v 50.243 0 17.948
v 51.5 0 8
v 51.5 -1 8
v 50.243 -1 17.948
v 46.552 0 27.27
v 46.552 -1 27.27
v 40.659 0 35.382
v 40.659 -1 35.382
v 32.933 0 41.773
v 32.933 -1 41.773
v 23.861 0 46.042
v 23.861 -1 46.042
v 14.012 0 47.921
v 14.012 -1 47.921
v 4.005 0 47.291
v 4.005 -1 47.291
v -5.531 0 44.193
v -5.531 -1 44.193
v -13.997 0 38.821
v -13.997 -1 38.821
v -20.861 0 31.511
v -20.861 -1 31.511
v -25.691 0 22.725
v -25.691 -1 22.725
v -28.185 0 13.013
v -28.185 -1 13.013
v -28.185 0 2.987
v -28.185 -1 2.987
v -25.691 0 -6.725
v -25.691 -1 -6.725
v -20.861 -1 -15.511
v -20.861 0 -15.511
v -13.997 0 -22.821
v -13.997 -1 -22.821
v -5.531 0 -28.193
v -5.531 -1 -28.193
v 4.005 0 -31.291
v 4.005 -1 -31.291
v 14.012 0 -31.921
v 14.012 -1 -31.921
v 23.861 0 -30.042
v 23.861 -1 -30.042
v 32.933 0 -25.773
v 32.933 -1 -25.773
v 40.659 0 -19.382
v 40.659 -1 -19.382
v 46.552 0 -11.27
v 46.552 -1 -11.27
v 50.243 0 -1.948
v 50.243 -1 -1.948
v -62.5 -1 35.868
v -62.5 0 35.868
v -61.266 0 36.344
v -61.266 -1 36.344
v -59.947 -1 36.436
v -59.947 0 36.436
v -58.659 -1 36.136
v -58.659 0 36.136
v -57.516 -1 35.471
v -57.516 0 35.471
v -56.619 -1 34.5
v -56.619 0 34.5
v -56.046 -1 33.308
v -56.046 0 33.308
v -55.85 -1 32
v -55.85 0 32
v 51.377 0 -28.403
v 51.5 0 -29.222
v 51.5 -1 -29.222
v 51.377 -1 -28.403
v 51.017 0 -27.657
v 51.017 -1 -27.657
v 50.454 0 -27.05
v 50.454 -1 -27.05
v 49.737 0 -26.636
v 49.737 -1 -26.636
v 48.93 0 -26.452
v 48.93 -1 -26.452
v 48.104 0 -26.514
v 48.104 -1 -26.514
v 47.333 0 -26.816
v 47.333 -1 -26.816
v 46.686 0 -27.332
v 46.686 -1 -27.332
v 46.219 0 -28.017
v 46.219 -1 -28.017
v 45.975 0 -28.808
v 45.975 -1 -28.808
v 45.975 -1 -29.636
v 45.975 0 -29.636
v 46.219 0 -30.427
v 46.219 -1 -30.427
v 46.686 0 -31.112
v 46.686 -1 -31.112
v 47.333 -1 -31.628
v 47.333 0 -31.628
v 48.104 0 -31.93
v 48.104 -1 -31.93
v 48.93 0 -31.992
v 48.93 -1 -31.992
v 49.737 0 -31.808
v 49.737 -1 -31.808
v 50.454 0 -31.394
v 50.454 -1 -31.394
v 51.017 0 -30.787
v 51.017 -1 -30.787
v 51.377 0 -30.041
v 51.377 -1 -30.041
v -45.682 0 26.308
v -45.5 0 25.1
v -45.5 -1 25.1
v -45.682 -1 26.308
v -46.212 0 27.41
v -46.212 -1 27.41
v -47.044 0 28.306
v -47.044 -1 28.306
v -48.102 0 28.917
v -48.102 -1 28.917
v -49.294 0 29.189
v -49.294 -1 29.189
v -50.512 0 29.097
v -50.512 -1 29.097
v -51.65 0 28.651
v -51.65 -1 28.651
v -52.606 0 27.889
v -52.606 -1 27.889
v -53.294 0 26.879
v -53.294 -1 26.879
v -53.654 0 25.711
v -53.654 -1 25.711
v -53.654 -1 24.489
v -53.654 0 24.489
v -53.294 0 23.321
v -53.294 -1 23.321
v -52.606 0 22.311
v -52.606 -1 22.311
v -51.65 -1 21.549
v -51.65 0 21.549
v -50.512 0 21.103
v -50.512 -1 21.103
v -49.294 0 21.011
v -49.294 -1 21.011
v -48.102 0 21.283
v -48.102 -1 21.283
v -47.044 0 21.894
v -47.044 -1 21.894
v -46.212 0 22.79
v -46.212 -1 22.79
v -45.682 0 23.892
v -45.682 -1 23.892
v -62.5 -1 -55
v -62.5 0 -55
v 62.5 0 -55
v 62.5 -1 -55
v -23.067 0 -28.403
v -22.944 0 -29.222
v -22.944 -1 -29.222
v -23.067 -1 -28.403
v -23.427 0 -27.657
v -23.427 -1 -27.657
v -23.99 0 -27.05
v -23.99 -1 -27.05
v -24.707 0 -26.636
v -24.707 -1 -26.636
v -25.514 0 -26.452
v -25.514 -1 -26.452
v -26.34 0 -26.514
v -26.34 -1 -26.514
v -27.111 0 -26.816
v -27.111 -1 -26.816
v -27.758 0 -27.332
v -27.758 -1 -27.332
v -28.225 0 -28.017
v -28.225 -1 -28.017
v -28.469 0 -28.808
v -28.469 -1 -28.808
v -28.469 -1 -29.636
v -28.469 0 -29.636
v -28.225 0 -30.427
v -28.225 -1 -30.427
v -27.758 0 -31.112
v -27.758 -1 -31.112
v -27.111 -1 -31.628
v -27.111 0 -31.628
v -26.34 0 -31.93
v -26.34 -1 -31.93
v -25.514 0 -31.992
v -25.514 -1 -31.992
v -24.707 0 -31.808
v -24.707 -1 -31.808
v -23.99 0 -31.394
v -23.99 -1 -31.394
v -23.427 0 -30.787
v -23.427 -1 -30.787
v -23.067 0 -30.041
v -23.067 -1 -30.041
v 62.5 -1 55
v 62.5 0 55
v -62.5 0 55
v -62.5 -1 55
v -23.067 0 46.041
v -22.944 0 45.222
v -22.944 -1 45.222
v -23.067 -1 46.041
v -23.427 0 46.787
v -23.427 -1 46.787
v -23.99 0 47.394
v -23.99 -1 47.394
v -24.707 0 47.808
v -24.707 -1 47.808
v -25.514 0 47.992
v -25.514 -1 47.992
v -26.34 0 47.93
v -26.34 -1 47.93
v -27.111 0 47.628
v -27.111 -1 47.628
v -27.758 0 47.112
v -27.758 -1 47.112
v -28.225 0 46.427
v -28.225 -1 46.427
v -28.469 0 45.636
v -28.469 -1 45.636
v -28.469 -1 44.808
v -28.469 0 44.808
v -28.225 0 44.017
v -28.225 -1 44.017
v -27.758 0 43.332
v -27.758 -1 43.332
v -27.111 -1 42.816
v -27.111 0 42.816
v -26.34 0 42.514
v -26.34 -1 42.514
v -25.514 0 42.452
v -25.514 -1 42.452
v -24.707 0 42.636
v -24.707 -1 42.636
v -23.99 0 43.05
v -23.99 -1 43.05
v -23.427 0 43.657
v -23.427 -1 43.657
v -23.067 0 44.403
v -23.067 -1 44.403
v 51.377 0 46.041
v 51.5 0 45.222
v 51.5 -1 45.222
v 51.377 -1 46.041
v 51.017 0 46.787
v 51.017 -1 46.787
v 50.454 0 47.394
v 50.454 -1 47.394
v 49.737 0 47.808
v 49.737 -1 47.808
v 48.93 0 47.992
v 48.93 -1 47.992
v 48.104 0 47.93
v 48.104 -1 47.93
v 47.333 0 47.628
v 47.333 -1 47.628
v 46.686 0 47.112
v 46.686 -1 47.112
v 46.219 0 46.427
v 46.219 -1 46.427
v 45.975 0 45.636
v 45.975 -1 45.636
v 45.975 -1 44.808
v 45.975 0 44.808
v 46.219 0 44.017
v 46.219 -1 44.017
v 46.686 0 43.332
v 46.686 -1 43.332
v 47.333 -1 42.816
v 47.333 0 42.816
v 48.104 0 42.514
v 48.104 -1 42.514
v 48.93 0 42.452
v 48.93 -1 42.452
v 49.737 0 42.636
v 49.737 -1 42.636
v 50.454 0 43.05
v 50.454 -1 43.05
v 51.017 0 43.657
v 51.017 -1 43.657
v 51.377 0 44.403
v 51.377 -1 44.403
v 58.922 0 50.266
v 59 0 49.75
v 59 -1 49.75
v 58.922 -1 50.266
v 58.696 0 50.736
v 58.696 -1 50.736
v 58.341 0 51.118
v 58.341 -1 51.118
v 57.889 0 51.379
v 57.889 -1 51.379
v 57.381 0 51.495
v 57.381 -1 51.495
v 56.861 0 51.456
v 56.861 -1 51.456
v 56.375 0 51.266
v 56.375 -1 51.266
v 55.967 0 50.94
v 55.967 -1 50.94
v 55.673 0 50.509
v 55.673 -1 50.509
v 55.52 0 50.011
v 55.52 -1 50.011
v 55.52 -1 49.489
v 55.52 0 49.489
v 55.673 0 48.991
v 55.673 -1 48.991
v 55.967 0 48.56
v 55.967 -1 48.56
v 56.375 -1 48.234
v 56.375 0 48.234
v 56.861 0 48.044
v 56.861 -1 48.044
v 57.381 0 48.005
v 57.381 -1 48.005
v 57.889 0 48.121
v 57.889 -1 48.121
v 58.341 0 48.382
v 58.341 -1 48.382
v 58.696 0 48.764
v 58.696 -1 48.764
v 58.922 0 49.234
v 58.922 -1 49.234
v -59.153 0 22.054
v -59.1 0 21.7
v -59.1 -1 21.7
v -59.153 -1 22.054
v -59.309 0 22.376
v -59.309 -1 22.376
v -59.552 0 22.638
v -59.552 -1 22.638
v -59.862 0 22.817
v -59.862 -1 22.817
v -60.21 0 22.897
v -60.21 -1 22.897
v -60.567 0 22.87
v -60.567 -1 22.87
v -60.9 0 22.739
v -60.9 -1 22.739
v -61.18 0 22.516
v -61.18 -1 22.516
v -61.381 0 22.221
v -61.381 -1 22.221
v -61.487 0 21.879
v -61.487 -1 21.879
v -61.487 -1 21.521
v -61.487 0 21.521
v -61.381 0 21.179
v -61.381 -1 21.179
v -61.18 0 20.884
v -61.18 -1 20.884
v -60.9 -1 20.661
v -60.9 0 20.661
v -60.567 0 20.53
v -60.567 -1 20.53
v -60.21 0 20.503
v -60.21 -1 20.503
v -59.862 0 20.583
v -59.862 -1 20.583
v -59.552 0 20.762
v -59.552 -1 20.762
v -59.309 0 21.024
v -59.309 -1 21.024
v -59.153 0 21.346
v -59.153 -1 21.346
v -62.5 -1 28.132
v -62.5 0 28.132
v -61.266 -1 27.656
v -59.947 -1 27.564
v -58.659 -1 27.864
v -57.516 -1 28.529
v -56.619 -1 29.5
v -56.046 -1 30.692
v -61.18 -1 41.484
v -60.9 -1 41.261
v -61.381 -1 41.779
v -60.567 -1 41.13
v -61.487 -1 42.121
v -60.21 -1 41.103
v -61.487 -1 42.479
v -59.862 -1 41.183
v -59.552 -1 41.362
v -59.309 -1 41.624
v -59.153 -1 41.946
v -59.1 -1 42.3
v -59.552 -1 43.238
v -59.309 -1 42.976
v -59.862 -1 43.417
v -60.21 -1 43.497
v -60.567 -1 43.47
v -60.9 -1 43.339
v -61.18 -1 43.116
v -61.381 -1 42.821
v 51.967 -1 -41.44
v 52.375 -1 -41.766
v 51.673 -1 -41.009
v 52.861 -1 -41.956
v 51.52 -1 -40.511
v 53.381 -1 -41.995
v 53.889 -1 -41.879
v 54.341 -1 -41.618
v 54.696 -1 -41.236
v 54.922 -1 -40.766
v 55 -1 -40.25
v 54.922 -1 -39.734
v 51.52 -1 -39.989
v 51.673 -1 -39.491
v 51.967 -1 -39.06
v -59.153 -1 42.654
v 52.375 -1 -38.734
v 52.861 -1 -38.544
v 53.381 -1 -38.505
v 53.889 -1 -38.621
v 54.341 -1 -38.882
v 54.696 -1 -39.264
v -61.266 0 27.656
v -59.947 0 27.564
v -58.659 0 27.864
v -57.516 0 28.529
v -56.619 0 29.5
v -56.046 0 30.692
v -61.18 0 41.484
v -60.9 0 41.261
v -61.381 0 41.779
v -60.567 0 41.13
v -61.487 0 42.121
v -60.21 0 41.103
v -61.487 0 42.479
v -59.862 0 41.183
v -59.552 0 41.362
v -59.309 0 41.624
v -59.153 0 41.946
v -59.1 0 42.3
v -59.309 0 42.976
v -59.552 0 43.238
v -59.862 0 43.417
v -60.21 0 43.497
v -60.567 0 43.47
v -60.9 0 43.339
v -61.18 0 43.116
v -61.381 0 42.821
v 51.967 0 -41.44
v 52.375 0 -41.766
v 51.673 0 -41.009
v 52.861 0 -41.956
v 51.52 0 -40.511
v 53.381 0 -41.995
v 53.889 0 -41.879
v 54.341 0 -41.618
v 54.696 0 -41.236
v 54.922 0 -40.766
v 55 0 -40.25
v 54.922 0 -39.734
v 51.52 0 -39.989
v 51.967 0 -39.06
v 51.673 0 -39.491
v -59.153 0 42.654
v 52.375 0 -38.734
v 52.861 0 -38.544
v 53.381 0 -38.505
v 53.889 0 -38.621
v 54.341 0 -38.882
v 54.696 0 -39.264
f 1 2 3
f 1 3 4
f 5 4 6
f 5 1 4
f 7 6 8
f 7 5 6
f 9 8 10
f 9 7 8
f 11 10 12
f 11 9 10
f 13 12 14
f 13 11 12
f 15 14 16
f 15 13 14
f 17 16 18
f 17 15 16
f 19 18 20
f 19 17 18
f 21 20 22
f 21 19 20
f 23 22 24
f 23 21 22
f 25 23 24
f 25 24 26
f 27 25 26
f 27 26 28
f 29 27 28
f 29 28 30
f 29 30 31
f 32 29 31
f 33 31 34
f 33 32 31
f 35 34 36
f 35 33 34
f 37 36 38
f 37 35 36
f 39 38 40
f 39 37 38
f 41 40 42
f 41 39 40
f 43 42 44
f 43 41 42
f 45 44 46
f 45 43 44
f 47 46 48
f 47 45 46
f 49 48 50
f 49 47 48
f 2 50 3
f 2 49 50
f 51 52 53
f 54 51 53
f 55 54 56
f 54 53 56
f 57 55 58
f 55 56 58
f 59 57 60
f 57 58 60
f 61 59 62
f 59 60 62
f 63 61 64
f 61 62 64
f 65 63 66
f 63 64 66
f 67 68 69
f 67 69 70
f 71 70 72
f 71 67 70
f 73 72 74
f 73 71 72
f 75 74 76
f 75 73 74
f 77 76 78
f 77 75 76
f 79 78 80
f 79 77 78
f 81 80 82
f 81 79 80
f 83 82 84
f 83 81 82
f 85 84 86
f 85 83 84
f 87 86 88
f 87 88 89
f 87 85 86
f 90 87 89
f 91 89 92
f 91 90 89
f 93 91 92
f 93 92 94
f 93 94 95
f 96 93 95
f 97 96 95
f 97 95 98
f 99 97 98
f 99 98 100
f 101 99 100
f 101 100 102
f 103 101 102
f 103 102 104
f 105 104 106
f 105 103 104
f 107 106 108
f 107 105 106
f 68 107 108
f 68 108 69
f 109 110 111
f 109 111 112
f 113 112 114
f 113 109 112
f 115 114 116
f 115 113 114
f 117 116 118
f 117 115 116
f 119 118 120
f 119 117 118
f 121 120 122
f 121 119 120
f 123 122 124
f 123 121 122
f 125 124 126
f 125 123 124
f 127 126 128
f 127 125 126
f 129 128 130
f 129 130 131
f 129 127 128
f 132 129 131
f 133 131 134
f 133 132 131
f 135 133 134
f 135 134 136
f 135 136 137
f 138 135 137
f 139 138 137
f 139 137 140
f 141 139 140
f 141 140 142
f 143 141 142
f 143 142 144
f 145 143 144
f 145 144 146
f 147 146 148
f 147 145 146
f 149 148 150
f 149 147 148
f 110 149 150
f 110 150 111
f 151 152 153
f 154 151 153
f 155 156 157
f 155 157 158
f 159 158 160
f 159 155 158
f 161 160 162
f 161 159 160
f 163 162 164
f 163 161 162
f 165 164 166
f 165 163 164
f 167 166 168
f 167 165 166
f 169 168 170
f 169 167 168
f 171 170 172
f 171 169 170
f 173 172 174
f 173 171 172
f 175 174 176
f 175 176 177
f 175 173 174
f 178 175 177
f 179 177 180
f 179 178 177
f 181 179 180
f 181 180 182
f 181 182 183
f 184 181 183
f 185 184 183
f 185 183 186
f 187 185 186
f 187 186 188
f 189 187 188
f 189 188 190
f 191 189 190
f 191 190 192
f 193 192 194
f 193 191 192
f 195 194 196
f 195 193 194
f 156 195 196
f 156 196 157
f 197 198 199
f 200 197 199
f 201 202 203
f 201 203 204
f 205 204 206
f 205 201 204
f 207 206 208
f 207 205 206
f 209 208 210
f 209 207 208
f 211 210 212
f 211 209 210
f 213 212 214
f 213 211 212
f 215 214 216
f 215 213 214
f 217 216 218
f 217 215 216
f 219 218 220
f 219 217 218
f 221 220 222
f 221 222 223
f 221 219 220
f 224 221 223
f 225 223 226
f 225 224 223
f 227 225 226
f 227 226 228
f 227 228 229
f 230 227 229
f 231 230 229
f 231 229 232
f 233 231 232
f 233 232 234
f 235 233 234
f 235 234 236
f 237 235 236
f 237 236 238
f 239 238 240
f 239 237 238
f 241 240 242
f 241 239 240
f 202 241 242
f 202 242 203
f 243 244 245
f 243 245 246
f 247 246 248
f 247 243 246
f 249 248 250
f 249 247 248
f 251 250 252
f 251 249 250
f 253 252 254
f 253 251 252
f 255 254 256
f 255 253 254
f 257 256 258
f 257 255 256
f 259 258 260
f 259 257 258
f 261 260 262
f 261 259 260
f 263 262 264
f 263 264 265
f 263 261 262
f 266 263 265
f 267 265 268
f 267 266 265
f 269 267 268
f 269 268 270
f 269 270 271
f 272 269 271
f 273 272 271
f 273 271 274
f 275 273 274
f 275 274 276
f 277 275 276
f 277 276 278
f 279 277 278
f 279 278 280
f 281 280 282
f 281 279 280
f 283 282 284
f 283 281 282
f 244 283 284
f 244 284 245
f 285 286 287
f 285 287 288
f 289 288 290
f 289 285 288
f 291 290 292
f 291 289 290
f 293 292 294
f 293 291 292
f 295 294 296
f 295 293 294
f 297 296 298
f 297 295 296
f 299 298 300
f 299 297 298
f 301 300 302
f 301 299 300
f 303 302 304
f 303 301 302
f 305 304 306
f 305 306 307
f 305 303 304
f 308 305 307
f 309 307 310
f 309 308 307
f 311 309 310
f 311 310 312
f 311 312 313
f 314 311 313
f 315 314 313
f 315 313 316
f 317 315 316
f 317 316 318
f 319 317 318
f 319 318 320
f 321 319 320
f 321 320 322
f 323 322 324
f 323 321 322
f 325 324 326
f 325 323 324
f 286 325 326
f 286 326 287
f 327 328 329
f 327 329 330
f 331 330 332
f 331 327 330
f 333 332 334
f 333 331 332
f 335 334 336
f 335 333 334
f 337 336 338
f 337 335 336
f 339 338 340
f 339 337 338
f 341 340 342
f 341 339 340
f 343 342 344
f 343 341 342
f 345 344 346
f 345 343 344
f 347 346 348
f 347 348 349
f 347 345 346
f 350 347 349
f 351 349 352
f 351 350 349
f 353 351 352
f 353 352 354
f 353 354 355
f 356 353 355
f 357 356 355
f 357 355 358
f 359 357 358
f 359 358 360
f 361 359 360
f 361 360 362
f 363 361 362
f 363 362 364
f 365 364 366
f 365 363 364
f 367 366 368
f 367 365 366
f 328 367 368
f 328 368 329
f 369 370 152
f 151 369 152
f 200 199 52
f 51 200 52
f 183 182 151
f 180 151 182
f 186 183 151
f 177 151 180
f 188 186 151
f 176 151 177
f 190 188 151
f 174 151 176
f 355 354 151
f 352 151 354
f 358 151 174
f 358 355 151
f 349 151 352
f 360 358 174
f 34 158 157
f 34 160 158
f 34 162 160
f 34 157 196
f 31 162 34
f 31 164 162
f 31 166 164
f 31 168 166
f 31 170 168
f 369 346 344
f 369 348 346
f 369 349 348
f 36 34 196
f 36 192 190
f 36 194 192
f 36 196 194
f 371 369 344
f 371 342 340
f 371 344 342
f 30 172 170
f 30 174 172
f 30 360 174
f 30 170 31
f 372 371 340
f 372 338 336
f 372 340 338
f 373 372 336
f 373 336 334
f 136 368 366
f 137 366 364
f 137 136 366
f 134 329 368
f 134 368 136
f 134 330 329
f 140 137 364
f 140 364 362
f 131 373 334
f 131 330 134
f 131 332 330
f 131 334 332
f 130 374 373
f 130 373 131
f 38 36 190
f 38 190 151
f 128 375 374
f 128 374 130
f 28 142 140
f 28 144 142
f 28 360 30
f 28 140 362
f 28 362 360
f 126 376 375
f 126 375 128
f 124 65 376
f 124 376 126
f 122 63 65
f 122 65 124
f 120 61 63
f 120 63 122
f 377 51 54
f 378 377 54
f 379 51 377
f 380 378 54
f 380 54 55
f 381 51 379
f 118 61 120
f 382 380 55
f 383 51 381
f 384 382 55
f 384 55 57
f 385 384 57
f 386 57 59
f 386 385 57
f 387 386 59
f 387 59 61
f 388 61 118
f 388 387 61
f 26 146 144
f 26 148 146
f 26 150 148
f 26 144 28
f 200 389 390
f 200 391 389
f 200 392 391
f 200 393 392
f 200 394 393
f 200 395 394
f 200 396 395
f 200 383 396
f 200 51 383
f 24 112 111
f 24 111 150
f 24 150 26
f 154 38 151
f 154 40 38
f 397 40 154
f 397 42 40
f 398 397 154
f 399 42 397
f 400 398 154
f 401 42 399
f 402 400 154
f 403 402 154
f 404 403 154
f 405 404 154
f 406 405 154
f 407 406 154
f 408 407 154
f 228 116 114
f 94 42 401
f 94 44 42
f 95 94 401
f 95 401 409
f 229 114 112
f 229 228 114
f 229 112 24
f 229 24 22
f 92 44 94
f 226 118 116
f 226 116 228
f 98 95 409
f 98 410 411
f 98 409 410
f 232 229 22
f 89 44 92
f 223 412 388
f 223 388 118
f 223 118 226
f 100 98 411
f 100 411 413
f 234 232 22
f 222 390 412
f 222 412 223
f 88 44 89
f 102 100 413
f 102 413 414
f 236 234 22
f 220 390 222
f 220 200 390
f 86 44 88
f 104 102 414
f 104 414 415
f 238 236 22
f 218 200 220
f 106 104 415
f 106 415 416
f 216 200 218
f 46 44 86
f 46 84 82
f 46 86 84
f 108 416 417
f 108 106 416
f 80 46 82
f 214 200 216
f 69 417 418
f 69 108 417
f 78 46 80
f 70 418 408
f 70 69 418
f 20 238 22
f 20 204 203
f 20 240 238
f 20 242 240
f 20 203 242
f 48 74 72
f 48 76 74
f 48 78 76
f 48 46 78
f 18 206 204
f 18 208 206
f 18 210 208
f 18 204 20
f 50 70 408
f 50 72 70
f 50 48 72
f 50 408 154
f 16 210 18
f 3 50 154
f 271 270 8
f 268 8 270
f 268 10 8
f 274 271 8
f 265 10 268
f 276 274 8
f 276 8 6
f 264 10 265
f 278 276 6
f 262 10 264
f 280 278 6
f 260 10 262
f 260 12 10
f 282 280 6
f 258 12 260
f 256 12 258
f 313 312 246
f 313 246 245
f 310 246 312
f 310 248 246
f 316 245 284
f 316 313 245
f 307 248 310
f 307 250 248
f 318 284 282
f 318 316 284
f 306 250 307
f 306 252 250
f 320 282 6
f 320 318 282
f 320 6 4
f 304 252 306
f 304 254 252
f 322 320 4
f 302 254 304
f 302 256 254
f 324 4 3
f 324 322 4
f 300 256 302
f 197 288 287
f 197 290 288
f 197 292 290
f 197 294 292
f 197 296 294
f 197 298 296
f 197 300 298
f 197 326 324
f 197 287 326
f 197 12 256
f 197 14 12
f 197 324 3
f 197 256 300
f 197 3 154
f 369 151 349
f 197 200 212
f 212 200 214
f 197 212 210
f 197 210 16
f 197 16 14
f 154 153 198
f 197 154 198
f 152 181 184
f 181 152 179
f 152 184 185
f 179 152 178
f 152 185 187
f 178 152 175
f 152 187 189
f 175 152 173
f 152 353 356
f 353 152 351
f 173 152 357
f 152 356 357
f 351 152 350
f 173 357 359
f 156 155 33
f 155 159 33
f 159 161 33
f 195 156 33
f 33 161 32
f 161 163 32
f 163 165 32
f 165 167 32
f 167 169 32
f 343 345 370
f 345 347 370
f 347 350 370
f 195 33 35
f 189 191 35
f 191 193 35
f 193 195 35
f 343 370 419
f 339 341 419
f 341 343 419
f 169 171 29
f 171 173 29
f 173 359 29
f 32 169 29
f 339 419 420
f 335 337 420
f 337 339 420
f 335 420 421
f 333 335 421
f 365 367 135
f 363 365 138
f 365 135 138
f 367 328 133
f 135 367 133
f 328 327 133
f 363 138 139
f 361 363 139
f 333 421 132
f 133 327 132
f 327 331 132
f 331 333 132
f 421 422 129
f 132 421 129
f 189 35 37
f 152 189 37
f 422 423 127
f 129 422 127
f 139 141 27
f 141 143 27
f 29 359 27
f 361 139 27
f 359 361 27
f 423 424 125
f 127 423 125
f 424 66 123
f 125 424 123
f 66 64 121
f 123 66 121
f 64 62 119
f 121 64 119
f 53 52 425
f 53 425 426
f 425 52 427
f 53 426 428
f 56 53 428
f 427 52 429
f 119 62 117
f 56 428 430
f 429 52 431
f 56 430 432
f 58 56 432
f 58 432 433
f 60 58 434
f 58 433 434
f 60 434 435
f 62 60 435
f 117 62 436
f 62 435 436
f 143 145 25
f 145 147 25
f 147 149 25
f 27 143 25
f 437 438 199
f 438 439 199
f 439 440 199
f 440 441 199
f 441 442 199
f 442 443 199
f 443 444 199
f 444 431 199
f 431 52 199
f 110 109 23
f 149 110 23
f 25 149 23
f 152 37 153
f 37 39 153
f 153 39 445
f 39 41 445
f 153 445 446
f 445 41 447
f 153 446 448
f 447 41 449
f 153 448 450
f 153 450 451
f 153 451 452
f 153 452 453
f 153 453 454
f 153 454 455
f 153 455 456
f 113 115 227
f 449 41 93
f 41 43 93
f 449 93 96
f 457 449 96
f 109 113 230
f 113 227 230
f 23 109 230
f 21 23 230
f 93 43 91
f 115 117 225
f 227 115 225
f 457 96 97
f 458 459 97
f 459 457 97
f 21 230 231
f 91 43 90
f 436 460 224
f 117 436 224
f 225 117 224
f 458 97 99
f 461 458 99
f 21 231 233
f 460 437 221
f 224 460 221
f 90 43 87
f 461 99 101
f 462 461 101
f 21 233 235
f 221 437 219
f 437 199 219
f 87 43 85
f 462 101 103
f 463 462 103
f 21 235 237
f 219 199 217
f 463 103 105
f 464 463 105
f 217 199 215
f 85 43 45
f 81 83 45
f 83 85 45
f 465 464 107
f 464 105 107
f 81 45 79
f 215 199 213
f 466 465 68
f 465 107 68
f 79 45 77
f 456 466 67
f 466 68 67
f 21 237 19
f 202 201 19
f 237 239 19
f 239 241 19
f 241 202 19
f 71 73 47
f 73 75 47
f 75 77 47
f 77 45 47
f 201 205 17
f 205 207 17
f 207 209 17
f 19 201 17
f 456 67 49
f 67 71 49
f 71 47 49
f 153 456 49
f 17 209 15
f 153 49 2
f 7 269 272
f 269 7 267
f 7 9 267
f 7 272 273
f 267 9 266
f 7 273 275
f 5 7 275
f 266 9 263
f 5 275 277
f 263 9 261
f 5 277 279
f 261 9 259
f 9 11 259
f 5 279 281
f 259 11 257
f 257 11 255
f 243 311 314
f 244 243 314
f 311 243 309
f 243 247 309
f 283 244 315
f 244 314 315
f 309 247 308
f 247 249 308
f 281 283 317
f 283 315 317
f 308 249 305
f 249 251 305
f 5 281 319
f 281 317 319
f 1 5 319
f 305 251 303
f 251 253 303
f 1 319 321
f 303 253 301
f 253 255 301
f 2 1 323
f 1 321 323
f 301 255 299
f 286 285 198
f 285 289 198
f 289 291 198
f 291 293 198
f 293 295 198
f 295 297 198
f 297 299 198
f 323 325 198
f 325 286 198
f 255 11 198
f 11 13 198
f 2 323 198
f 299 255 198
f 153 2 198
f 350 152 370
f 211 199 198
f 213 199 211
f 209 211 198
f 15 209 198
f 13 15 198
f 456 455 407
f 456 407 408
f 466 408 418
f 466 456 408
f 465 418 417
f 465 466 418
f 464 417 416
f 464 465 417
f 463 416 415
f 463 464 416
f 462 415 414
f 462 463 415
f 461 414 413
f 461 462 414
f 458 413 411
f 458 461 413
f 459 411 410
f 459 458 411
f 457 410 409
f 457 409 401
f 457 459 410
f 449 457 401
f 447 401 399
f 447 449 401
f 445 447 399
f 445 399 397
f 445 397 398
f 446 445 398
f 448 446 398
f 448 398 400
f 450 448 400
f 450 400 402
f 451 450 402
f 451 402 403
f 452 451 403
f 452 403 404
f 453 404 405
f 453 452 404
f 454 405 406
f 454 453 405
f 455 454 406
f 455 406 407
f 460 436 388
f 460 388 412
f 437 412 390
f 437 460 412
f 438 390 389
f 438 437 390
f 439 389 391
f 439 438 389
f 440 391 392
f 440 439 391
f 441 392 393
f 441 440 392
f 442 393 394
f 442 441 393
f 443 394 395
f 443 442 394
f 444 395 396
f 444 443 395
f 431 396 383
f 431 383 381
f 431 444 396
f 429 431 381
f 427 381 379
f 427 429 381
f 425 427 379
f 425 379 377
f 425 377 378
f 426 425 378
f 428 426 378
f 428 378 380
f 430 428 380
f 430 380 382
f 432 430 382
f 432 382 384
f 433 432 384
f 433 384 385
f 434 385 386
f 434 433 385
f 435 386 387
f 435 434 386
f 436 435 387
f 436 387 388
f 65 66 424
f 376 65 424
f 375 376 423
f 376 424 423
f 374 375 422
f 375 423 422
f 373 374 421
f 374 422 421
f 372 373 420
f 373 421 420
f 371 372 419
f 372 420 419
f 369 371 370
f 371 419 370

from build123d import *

# Parameters (mm, degrees)
F0_R     = 2.778
F0_R_2   = 1.75
F0_R_3   = 1.2
F0_R_4   = 4.1
F0_R_5   = 40
F1_DEPTH = 1


# Not quite as in the source:
# - a feature names something its author has since deleted; it is built from what else it names


with BuildPart() as f1:
    # F0 (on Front) → F1 (new body)
    with BuildSketch(Plane.XZ):
        with BuildLine():
            Line((-62.5, 28.1318609125), (-62.5, -55))
            Line((-62.5, -55), (62.5, -55))
            Line((62.5, -55), (62.5, 55))
            Line((62.5, 55), (-62.5, 55))
            Line((-62.5, 55), (-62.5, 35.8681390875))
            ThreePointArc((-62.5, 35.8681390875), (-58.0625349165, 35.8465893984), (-55.85, 32))
            ThreePointArc((-55.85, 32), (-58.0625349165, 28.1534106016), (-62.5, 28.1318609125))
        make_face()
        with Locations((-25.722, -29.222)):
            Circle(F0_R, mode=Mode.SUBTRACT)
        with Locations((53.25, -40.25)):
            Circle(F0_R_2, mode=Mode.SUBTRACT)
        with Locations((48.722, -29.222)):
            Circle(F0_R, mode=Mode.SUBTRACT)
        with Locations((-60.3, 21.7)):
            Circle(F0_R_3, mode=Mode.SUBTRACT)
        with Locations((-49.6, 25.1)):
            Circle(F0_R_4, mode=Mode.SUBTRACT)
        with Locations((-60.3, 42.3)):
            Circle(F0_R_3, mode=Mode.SUBTRACT)
        with Locations((-25.722, 45.222)):
            Circle(F0_R, mode=Mode.SUBTRACT)
        with Locations((11.5, 8)):
            Circle(F0_R_5, mode=Mode.SUBTRACT)
        with Locations((48.722, 45.222)):
            Circle(F0_R, mode=Mode.SUBTRACT)
        with Locations((57.25, 49.75)):
            Circle(F0_R_2, mode=Mode.SUBTRACT)
    extrude(amount=F1_DEPTH)


solid = f1.part
